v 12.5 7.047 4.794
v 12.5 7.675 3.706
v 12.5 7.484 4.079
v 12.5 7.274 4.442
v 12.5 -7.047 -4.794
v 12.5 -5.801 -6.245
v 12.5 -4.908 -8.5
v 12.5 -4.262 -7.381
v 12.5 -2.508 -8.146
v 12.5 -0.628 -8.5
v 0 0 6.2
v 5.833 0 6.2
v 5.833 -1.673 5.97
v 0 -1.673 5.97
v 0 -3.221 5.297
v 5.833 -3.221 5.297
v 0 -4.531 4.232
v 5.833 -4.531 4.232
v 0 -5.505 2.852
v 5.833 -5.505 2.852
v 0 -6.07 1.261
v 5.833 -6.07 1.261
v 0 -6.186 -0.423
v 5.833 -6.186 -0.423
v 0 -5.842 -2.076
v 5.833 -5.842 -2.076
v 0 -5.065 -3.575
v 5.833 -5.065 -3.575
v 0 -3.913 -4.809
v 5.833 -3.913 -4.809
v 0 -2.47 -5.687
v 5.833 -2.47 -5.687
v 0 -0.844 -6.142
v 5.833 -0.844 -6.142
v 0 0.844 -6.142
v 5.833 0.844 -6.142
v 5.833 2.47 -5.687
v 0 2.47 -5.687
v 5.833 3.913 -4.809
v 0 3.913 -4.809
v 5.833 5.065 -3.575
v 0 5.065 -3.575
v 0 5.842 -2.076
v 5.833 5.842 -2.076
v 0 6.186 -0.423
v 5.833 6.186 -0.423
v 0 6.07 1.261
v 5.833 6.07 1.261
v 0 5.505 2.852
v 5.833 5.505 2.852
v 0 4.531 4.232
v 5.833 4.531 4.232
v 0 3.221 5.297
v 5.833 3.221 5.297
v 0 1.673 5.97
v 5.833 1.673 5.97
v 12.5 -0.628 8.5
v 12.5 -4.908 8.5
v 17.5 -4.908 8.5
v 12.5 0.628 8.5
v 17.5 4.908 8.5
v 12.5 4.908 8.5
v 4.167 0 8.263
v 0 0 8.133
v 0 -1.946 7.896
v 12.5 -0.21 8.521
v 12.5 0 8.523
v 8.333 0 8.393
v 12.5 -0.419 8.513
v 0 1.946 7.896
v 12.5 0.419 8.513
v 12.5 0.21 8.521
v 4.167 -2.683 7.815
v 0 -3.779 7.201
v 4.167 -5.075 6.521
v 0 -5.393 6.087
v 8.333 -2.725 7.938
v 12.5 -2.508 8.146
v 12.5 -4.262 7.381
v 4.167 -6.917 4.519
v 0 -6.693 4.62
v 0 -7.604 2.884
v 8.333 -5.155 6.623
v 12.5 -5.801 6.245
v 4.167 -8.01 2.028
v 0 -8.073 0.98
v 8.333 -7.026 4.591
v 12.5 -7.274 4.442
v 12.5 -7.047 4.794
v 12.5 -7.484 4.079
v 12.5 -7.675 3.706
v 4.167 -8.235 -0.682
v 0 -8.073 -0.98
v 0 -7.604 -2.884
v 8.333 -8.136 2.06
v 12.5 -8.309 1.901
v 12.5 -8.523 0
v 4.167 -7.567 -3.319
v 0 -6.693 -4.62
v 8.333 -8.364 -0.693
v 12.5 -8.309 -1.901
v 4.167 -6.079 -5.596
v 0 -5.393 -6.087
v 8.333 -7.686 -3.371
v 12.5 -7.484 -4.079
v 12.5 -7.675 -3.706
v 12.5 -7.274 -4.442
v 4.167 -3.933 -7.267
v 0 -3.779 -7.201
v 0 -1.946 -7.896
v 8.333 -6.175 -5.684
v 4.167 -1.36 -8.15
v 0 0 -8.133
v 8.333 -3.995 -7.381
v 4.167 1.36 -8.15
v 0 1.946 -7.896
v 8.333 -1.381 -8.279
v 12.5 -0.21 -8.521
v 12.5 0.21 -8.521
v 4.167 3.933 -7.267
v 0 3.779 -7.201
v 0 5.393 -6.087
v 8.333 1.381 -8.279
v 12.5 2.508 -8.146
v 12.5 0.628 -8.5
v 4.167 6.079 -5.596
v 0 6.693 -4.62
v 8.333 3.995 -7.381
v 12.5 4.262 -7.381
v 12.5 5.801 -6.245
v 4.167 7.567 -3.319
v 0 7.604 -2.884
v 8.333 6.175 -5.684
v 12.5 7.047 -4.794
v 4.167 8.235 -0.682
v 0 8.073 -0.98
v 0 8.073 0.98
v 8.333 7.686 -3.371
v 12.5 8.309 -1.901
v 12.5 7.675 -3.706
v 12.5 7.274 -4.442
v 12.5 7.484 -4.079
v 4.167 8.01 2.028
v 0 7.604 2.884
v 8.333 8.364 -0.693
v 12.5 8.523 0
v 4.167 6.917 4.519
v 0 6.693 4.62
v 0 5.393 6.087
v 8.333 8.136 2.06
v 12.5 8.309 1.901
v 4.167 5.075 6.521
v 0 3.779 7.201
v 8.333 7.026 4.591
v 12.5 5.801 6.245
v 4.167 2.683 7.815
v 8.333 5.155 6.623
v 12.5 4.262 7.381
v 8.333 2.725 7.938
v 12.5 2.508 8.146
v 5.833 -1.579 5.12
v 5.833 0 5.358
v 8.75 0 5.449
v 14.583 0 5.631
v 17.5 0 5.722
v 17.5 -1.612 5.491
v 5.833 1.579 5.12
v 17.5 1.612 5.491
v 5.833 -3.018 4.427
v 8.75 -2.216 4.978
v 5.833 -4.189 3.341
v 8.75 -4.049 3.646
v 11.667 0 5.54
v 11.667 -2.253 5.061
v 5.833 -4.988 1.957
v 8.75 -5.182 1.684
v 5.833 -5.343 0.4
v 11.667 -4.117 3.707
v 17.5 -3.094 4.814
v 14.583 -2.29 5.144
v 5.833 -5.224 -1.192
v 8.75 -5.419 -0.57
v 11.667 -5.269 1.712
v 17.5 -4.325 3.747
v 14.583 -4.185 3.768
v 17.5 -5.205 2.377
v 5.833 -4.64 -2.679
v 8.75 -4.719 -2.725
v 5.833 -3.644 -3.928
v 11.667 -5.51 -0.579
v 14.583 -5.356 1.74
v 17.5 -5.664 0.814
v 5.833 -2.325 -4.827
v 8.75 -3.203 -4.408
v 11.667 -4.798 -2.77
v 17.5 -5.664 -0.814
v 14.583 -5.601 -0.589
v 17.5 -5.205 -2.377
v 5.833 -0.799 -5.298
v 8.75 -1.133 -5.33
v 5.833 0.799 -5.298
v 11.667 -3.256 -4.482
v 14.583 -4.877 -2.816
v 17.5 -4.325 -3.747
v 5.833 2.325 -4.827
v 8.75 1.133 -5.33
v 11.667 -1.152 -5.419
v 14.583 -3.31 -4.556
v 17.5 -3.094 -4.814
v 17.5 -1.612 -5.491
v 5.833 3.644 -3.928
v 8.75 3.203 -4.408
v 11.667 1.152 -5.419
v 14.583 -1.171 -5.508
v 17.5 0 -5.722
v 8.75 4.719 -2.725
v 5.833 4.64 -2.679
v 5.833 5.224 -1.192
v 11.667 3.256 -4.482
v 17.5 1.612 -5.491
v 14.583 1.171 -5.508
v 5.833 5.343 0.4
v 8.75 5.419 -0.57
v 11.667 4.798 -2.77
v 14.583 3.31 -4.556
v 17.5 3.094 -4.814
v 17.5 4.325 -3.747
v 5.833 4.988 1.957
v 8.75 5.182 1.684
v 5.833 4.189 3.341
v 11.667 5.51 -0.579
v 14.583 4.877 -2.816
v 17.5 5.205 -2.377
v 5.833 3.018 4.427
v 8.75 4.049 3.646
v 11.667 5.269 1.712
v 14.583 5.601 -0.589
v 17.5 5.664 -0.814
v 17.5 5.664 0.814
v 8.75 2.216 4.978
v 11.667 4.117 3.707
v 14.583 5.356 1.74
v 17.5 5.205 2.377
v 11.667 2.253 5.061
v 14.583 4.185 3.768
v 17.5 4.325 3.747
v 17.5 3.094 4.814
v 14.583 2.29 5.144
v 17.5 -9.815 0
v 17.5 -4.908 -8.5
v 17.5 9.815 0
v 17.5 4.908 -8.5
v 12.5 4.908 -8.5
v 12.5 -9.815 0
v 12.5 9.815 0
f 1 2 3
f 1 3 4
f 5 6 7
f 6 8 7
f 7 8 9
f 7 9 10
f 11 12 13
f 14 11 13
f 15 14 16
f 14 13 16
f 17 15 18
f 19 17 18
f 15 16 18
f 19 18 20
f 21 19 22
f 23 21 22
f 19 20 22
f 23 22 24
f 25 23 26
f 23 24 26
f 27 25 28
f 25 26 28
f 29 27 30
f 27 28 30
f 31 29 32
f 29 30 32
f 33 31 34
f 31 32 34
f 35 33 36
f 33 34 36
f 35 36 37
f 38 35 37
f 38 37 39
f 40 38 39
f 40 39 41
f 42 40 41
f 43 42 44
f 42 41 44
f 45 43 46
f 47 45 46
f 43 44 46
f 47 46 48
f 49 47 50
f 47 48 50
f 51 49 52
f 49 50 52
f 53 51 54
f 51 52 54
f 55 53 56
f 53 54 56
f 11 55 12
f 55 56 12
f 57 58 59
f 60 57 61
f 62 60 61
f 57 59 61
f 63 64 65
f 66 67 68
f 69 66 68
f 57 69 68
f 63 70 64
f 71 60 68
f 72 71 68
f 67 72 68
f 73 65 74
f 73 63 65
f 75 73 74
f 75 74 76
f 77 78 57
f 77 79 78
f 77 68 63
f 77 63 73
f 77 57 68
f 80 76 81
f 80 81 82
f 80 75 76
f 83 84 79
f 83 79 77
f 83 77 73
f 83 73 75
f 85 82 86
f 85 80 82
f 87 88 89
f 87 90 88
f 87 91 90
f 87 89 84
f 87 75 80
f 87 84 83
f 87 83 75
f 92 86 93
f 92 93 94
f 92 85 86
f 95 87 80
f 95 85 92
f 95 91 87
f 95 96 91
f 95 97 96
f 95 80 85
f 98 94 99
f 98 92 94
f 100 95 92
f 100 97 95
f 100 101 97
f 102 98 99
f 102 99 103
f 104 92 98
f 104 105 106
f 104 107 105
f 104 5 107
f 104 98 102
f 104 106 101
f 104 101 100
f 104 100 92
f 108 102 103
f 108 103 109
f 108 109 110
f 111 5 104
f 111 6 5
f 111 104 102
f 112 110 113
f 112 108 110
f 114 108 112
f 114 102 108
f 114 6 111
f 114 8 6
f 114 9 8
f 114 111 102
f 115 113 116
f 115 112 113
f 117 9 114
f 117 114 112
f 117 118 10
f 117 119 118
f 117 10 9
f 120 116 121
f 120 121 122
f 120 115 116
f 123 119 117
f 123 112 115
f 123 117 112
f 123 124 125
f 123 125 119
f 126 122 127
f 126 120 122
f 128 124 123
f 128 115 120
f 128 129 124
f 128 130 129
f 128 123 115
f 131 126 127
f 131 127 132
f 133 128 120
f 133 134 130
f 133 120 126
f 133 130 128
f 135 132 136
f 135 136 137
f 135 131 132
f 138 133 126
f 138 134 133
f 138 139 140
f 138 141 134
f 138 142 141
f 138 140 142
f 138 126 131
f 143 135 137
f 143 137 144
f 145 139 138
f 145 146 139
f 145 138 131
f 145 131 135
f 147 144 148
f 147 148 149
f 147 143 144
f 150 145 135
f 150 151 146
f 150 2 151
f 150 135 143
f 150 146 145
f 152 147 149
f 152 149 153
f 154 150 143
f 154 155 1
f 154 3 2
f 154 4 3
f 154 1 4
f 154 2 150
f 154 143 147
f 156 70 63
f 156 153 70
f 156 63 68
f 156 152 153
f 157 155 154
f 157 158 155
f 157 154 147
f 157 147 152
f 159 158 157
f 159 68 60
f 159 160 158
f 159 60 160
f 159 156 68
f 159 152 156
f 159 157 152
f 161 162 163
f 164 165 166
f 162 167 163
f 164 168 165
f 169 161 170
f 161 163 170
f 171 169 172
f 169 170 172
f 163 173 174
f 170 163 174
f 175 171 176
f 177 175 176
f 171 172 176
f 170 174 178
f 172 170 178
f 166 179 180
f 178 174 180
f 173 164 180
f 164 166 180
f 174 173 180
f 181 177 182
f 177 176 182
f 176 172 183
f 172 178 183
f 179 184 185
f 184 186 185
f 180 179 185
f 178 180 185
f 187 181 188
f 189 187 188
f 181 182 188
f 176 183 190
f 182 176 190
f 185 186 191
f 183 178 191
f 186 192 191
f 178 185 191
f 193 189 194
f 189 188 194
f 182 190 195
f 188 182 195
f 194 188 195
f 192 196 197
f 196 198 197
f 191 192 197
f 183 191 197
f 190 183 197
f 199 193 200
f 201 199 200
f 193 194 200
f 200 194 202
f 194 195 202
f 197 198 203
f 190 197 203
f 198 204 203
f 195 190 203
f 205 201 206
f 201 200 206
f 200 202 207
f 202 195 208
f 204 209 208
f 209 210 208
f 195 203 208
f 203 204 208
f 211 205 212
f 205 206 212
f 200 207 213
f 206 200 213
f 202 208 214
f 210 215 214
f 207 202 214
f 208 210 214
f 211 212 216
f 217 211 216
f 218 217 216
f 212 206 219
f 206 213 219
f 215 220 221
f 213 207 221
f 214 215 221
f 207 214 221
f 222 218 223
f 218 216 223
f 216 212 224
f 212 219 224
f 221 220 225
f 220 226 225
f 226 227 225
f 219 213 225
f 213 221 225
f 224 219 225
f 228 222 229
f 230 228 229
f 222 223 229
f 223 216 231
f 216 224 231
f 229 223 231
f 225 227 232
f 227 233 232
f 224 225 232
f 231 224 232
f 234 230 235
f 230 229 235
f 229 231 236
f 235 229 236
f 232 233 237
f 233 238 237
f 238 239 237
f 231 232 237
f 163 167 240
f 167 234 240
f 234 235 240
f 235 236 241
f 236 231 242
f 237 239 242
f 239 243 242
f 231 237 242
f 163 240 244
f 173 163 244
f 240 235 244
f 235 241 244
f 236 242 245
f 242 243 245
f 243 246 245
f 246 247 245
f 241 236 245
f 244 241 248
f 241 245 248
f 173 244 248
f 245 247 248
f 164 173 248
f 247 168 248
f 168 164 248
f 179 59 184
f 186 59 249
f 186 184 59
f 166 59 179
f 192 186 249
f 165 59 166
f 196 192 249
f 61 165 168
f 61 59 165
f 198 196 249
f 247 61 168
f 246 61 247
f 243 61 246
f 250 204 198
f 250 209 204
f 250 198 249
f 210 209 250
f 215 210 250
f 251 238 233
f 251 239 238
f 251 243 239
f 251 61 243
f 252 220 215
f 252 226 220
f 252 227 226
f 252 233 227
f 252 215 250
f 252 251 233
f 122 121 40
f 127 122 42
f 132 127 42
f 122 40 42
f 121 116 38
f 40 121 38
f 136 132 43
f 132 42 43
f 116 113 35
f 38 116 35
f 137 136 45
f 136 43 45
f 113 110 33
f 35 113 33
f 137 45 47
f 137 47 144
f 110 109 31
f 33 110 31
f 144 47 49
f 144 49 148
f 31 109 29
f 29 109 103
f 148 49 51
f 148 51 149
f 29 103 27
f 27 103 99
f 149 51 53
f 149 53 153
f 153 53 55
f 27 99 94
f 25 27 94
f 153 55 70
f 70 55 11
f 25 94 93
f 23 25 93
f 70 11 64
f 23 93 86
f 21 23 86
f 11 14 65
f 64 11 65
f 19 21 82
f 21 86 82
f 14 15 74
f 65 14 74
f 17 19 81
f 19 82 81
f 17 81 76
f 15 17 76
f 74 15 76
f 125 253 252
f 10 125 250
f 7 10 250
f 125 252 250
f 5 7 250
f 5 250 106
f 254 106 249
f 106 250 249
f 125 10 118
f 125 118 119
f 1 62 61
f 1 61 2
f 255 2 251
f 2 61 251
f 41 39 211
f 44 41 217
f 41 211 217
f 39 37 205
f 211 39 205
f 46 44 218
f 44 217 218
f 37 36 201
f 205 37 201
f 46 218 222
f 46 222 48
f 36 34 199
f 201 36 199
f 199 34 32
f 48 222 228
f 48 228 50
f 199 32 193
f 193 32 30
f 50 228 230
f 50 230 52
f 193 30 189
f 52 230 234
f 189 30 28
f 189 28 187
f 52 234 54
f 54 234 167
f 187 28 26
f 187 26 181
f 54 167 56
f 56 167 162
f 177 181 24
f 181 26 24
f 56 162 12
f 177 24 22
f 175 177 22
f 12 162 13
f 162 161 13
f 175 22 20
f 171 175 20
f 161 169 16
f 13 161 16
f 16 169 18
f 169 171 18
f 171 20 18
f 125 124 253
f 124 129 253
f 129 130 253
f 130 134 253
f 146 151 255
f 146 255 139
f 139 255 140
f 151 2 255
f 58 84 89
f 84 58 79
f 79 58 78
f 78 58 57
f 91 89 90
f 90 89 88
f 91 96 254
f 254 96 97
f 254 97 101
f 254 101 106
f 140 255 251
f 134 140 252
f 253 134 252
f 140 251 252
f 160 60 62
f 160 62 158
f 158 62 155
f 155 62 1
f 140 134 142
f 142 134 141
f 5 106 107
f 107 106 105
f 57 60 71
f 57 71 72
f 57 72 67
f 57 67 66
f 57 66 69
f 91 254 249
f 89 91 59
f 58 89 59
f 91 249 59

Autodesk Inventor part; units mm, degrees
ref_plane "YZ Plane" through (0, 0, 0) normal (1, 0, 0) x (0, 1, 0)
ref_plane "XZ Plane" through (0, 0, 0) normal (0, 1, 0) x (-1, 0, 0)
ref_plane "XY Plane" through (0, 0, 0) normal (0, 0, 1) x (1, 0, 0)
sketch "Sketch1" plane through (0, 0, 0) normal (0, 1, 0) x (-1, 0, 0)
  line L0 (0, 0) -> (-17.5, 0)
  line L1 (-17.5, 0) -> (-17.5, 5.7225) construction
  line L2 (-17.5, 8.5) -> (-12.5, 8.5)
  line L3 (-12.5, 8.5) -> (-12.5, 8.5)
  line L4 (-17.5, 8.5) -> (-17.5, 5.7225)
  line L5 (-12.5, 8.5) -> (-12.5, 8.5232)
  line L6 (-12.5, 8.5232) -> (0, 8.1326)
  line L7 (0, 8.1326) -> (0, 6.2)
  line L8 (-5.8333, 5.3579) -> (-17.5, 5.7225)
  line L9 (0, 6.2) -> (0, 0) construction
  line L10 (0, 6.2) -> (-5.8333, 6.2)
  line L11 (-5.8333, 6.2) -> (-5.8333, 5.3579)
  line L12 (-6.35, 8.331) -> (-6.35, 0) construction
  dimension "d0" = 11.445
  dimension "d1" = 17
  dimension "d4" = 17.5
  dimension "d5" = 5
  dimension "d7" = 1.79
  dimension "d9" = 12.4
  dimension "d10" = 5.8333
  dimension "d38" = 6.35
  dimension "d39" = 16.662
revolve "Revolve1" add sketch "Sketch1" angle 360 about axis through (0, 0, 0) along (1, 0, 0)
sketch "Sketch2" plane through (17.5, 0, 0) normal (1, 0, 0) x (0, 0, -1)
  circle A0 centre (0, 0) radius 8.5 projected
  line L0 (-8.5, 4.9075) -> (0, 9.815)
  line L1 (0, 9.815) -> (8.5, 4.9075)
  line L2 (8.5, 4.9075) -> (8.5, -4.9075)
  line L3 (8.5, -4.9075) -> (0, -9.815)
  line L4 (0, -9.815) -> (-8.5, -4.9075)
  line L5 (-8.5, -4.9075) -> (-8.5, 4.9075)
  point P0 (-8.5, 0)
extrude "Extrude1" add sketch "Sketch2" against normal blind 5 contours L2 L3 A0 | A0 L1 L2 | A0 L0 L1 | L3 L4 A0 | A0 L5 L0 | L4 L5 A0
thread "Gwint1" size "R 3/8" standard "ISO Taper" full length
thread "Gwint2" size "Rc 1/4" standard "ISO Taper Internal" full length
equation "\"d0\" = MD"
equation "\"d1\" = S"
equation "\"d4\" = L"
equation "\"d5\" = m1"
equation "\"d9\" = D3"
equation "\"d10\" = 0.333333 * L"
equation "\"d38\" = a"
equation "\"d39\" = MjD"
equation "\"d2\" = m1"
equation "\"MD\" = 11.445"
equation "\"m1\" = 5"
equation "\"S\" = 17"
equation "\"L\" = 17.5"
equation "\"D3\" = 12.4"
equation "\"a\" = 6.35"
equation "\"MjD\" = 16.662"
equation "\"a1\" = 3.7"
equation "\"Size_Designation\" = 1.2345"
properties part number "ISO 4145 Tuleja redukcyjna N4 3/8 x 1/4" material "Aluminium AW-7020"
